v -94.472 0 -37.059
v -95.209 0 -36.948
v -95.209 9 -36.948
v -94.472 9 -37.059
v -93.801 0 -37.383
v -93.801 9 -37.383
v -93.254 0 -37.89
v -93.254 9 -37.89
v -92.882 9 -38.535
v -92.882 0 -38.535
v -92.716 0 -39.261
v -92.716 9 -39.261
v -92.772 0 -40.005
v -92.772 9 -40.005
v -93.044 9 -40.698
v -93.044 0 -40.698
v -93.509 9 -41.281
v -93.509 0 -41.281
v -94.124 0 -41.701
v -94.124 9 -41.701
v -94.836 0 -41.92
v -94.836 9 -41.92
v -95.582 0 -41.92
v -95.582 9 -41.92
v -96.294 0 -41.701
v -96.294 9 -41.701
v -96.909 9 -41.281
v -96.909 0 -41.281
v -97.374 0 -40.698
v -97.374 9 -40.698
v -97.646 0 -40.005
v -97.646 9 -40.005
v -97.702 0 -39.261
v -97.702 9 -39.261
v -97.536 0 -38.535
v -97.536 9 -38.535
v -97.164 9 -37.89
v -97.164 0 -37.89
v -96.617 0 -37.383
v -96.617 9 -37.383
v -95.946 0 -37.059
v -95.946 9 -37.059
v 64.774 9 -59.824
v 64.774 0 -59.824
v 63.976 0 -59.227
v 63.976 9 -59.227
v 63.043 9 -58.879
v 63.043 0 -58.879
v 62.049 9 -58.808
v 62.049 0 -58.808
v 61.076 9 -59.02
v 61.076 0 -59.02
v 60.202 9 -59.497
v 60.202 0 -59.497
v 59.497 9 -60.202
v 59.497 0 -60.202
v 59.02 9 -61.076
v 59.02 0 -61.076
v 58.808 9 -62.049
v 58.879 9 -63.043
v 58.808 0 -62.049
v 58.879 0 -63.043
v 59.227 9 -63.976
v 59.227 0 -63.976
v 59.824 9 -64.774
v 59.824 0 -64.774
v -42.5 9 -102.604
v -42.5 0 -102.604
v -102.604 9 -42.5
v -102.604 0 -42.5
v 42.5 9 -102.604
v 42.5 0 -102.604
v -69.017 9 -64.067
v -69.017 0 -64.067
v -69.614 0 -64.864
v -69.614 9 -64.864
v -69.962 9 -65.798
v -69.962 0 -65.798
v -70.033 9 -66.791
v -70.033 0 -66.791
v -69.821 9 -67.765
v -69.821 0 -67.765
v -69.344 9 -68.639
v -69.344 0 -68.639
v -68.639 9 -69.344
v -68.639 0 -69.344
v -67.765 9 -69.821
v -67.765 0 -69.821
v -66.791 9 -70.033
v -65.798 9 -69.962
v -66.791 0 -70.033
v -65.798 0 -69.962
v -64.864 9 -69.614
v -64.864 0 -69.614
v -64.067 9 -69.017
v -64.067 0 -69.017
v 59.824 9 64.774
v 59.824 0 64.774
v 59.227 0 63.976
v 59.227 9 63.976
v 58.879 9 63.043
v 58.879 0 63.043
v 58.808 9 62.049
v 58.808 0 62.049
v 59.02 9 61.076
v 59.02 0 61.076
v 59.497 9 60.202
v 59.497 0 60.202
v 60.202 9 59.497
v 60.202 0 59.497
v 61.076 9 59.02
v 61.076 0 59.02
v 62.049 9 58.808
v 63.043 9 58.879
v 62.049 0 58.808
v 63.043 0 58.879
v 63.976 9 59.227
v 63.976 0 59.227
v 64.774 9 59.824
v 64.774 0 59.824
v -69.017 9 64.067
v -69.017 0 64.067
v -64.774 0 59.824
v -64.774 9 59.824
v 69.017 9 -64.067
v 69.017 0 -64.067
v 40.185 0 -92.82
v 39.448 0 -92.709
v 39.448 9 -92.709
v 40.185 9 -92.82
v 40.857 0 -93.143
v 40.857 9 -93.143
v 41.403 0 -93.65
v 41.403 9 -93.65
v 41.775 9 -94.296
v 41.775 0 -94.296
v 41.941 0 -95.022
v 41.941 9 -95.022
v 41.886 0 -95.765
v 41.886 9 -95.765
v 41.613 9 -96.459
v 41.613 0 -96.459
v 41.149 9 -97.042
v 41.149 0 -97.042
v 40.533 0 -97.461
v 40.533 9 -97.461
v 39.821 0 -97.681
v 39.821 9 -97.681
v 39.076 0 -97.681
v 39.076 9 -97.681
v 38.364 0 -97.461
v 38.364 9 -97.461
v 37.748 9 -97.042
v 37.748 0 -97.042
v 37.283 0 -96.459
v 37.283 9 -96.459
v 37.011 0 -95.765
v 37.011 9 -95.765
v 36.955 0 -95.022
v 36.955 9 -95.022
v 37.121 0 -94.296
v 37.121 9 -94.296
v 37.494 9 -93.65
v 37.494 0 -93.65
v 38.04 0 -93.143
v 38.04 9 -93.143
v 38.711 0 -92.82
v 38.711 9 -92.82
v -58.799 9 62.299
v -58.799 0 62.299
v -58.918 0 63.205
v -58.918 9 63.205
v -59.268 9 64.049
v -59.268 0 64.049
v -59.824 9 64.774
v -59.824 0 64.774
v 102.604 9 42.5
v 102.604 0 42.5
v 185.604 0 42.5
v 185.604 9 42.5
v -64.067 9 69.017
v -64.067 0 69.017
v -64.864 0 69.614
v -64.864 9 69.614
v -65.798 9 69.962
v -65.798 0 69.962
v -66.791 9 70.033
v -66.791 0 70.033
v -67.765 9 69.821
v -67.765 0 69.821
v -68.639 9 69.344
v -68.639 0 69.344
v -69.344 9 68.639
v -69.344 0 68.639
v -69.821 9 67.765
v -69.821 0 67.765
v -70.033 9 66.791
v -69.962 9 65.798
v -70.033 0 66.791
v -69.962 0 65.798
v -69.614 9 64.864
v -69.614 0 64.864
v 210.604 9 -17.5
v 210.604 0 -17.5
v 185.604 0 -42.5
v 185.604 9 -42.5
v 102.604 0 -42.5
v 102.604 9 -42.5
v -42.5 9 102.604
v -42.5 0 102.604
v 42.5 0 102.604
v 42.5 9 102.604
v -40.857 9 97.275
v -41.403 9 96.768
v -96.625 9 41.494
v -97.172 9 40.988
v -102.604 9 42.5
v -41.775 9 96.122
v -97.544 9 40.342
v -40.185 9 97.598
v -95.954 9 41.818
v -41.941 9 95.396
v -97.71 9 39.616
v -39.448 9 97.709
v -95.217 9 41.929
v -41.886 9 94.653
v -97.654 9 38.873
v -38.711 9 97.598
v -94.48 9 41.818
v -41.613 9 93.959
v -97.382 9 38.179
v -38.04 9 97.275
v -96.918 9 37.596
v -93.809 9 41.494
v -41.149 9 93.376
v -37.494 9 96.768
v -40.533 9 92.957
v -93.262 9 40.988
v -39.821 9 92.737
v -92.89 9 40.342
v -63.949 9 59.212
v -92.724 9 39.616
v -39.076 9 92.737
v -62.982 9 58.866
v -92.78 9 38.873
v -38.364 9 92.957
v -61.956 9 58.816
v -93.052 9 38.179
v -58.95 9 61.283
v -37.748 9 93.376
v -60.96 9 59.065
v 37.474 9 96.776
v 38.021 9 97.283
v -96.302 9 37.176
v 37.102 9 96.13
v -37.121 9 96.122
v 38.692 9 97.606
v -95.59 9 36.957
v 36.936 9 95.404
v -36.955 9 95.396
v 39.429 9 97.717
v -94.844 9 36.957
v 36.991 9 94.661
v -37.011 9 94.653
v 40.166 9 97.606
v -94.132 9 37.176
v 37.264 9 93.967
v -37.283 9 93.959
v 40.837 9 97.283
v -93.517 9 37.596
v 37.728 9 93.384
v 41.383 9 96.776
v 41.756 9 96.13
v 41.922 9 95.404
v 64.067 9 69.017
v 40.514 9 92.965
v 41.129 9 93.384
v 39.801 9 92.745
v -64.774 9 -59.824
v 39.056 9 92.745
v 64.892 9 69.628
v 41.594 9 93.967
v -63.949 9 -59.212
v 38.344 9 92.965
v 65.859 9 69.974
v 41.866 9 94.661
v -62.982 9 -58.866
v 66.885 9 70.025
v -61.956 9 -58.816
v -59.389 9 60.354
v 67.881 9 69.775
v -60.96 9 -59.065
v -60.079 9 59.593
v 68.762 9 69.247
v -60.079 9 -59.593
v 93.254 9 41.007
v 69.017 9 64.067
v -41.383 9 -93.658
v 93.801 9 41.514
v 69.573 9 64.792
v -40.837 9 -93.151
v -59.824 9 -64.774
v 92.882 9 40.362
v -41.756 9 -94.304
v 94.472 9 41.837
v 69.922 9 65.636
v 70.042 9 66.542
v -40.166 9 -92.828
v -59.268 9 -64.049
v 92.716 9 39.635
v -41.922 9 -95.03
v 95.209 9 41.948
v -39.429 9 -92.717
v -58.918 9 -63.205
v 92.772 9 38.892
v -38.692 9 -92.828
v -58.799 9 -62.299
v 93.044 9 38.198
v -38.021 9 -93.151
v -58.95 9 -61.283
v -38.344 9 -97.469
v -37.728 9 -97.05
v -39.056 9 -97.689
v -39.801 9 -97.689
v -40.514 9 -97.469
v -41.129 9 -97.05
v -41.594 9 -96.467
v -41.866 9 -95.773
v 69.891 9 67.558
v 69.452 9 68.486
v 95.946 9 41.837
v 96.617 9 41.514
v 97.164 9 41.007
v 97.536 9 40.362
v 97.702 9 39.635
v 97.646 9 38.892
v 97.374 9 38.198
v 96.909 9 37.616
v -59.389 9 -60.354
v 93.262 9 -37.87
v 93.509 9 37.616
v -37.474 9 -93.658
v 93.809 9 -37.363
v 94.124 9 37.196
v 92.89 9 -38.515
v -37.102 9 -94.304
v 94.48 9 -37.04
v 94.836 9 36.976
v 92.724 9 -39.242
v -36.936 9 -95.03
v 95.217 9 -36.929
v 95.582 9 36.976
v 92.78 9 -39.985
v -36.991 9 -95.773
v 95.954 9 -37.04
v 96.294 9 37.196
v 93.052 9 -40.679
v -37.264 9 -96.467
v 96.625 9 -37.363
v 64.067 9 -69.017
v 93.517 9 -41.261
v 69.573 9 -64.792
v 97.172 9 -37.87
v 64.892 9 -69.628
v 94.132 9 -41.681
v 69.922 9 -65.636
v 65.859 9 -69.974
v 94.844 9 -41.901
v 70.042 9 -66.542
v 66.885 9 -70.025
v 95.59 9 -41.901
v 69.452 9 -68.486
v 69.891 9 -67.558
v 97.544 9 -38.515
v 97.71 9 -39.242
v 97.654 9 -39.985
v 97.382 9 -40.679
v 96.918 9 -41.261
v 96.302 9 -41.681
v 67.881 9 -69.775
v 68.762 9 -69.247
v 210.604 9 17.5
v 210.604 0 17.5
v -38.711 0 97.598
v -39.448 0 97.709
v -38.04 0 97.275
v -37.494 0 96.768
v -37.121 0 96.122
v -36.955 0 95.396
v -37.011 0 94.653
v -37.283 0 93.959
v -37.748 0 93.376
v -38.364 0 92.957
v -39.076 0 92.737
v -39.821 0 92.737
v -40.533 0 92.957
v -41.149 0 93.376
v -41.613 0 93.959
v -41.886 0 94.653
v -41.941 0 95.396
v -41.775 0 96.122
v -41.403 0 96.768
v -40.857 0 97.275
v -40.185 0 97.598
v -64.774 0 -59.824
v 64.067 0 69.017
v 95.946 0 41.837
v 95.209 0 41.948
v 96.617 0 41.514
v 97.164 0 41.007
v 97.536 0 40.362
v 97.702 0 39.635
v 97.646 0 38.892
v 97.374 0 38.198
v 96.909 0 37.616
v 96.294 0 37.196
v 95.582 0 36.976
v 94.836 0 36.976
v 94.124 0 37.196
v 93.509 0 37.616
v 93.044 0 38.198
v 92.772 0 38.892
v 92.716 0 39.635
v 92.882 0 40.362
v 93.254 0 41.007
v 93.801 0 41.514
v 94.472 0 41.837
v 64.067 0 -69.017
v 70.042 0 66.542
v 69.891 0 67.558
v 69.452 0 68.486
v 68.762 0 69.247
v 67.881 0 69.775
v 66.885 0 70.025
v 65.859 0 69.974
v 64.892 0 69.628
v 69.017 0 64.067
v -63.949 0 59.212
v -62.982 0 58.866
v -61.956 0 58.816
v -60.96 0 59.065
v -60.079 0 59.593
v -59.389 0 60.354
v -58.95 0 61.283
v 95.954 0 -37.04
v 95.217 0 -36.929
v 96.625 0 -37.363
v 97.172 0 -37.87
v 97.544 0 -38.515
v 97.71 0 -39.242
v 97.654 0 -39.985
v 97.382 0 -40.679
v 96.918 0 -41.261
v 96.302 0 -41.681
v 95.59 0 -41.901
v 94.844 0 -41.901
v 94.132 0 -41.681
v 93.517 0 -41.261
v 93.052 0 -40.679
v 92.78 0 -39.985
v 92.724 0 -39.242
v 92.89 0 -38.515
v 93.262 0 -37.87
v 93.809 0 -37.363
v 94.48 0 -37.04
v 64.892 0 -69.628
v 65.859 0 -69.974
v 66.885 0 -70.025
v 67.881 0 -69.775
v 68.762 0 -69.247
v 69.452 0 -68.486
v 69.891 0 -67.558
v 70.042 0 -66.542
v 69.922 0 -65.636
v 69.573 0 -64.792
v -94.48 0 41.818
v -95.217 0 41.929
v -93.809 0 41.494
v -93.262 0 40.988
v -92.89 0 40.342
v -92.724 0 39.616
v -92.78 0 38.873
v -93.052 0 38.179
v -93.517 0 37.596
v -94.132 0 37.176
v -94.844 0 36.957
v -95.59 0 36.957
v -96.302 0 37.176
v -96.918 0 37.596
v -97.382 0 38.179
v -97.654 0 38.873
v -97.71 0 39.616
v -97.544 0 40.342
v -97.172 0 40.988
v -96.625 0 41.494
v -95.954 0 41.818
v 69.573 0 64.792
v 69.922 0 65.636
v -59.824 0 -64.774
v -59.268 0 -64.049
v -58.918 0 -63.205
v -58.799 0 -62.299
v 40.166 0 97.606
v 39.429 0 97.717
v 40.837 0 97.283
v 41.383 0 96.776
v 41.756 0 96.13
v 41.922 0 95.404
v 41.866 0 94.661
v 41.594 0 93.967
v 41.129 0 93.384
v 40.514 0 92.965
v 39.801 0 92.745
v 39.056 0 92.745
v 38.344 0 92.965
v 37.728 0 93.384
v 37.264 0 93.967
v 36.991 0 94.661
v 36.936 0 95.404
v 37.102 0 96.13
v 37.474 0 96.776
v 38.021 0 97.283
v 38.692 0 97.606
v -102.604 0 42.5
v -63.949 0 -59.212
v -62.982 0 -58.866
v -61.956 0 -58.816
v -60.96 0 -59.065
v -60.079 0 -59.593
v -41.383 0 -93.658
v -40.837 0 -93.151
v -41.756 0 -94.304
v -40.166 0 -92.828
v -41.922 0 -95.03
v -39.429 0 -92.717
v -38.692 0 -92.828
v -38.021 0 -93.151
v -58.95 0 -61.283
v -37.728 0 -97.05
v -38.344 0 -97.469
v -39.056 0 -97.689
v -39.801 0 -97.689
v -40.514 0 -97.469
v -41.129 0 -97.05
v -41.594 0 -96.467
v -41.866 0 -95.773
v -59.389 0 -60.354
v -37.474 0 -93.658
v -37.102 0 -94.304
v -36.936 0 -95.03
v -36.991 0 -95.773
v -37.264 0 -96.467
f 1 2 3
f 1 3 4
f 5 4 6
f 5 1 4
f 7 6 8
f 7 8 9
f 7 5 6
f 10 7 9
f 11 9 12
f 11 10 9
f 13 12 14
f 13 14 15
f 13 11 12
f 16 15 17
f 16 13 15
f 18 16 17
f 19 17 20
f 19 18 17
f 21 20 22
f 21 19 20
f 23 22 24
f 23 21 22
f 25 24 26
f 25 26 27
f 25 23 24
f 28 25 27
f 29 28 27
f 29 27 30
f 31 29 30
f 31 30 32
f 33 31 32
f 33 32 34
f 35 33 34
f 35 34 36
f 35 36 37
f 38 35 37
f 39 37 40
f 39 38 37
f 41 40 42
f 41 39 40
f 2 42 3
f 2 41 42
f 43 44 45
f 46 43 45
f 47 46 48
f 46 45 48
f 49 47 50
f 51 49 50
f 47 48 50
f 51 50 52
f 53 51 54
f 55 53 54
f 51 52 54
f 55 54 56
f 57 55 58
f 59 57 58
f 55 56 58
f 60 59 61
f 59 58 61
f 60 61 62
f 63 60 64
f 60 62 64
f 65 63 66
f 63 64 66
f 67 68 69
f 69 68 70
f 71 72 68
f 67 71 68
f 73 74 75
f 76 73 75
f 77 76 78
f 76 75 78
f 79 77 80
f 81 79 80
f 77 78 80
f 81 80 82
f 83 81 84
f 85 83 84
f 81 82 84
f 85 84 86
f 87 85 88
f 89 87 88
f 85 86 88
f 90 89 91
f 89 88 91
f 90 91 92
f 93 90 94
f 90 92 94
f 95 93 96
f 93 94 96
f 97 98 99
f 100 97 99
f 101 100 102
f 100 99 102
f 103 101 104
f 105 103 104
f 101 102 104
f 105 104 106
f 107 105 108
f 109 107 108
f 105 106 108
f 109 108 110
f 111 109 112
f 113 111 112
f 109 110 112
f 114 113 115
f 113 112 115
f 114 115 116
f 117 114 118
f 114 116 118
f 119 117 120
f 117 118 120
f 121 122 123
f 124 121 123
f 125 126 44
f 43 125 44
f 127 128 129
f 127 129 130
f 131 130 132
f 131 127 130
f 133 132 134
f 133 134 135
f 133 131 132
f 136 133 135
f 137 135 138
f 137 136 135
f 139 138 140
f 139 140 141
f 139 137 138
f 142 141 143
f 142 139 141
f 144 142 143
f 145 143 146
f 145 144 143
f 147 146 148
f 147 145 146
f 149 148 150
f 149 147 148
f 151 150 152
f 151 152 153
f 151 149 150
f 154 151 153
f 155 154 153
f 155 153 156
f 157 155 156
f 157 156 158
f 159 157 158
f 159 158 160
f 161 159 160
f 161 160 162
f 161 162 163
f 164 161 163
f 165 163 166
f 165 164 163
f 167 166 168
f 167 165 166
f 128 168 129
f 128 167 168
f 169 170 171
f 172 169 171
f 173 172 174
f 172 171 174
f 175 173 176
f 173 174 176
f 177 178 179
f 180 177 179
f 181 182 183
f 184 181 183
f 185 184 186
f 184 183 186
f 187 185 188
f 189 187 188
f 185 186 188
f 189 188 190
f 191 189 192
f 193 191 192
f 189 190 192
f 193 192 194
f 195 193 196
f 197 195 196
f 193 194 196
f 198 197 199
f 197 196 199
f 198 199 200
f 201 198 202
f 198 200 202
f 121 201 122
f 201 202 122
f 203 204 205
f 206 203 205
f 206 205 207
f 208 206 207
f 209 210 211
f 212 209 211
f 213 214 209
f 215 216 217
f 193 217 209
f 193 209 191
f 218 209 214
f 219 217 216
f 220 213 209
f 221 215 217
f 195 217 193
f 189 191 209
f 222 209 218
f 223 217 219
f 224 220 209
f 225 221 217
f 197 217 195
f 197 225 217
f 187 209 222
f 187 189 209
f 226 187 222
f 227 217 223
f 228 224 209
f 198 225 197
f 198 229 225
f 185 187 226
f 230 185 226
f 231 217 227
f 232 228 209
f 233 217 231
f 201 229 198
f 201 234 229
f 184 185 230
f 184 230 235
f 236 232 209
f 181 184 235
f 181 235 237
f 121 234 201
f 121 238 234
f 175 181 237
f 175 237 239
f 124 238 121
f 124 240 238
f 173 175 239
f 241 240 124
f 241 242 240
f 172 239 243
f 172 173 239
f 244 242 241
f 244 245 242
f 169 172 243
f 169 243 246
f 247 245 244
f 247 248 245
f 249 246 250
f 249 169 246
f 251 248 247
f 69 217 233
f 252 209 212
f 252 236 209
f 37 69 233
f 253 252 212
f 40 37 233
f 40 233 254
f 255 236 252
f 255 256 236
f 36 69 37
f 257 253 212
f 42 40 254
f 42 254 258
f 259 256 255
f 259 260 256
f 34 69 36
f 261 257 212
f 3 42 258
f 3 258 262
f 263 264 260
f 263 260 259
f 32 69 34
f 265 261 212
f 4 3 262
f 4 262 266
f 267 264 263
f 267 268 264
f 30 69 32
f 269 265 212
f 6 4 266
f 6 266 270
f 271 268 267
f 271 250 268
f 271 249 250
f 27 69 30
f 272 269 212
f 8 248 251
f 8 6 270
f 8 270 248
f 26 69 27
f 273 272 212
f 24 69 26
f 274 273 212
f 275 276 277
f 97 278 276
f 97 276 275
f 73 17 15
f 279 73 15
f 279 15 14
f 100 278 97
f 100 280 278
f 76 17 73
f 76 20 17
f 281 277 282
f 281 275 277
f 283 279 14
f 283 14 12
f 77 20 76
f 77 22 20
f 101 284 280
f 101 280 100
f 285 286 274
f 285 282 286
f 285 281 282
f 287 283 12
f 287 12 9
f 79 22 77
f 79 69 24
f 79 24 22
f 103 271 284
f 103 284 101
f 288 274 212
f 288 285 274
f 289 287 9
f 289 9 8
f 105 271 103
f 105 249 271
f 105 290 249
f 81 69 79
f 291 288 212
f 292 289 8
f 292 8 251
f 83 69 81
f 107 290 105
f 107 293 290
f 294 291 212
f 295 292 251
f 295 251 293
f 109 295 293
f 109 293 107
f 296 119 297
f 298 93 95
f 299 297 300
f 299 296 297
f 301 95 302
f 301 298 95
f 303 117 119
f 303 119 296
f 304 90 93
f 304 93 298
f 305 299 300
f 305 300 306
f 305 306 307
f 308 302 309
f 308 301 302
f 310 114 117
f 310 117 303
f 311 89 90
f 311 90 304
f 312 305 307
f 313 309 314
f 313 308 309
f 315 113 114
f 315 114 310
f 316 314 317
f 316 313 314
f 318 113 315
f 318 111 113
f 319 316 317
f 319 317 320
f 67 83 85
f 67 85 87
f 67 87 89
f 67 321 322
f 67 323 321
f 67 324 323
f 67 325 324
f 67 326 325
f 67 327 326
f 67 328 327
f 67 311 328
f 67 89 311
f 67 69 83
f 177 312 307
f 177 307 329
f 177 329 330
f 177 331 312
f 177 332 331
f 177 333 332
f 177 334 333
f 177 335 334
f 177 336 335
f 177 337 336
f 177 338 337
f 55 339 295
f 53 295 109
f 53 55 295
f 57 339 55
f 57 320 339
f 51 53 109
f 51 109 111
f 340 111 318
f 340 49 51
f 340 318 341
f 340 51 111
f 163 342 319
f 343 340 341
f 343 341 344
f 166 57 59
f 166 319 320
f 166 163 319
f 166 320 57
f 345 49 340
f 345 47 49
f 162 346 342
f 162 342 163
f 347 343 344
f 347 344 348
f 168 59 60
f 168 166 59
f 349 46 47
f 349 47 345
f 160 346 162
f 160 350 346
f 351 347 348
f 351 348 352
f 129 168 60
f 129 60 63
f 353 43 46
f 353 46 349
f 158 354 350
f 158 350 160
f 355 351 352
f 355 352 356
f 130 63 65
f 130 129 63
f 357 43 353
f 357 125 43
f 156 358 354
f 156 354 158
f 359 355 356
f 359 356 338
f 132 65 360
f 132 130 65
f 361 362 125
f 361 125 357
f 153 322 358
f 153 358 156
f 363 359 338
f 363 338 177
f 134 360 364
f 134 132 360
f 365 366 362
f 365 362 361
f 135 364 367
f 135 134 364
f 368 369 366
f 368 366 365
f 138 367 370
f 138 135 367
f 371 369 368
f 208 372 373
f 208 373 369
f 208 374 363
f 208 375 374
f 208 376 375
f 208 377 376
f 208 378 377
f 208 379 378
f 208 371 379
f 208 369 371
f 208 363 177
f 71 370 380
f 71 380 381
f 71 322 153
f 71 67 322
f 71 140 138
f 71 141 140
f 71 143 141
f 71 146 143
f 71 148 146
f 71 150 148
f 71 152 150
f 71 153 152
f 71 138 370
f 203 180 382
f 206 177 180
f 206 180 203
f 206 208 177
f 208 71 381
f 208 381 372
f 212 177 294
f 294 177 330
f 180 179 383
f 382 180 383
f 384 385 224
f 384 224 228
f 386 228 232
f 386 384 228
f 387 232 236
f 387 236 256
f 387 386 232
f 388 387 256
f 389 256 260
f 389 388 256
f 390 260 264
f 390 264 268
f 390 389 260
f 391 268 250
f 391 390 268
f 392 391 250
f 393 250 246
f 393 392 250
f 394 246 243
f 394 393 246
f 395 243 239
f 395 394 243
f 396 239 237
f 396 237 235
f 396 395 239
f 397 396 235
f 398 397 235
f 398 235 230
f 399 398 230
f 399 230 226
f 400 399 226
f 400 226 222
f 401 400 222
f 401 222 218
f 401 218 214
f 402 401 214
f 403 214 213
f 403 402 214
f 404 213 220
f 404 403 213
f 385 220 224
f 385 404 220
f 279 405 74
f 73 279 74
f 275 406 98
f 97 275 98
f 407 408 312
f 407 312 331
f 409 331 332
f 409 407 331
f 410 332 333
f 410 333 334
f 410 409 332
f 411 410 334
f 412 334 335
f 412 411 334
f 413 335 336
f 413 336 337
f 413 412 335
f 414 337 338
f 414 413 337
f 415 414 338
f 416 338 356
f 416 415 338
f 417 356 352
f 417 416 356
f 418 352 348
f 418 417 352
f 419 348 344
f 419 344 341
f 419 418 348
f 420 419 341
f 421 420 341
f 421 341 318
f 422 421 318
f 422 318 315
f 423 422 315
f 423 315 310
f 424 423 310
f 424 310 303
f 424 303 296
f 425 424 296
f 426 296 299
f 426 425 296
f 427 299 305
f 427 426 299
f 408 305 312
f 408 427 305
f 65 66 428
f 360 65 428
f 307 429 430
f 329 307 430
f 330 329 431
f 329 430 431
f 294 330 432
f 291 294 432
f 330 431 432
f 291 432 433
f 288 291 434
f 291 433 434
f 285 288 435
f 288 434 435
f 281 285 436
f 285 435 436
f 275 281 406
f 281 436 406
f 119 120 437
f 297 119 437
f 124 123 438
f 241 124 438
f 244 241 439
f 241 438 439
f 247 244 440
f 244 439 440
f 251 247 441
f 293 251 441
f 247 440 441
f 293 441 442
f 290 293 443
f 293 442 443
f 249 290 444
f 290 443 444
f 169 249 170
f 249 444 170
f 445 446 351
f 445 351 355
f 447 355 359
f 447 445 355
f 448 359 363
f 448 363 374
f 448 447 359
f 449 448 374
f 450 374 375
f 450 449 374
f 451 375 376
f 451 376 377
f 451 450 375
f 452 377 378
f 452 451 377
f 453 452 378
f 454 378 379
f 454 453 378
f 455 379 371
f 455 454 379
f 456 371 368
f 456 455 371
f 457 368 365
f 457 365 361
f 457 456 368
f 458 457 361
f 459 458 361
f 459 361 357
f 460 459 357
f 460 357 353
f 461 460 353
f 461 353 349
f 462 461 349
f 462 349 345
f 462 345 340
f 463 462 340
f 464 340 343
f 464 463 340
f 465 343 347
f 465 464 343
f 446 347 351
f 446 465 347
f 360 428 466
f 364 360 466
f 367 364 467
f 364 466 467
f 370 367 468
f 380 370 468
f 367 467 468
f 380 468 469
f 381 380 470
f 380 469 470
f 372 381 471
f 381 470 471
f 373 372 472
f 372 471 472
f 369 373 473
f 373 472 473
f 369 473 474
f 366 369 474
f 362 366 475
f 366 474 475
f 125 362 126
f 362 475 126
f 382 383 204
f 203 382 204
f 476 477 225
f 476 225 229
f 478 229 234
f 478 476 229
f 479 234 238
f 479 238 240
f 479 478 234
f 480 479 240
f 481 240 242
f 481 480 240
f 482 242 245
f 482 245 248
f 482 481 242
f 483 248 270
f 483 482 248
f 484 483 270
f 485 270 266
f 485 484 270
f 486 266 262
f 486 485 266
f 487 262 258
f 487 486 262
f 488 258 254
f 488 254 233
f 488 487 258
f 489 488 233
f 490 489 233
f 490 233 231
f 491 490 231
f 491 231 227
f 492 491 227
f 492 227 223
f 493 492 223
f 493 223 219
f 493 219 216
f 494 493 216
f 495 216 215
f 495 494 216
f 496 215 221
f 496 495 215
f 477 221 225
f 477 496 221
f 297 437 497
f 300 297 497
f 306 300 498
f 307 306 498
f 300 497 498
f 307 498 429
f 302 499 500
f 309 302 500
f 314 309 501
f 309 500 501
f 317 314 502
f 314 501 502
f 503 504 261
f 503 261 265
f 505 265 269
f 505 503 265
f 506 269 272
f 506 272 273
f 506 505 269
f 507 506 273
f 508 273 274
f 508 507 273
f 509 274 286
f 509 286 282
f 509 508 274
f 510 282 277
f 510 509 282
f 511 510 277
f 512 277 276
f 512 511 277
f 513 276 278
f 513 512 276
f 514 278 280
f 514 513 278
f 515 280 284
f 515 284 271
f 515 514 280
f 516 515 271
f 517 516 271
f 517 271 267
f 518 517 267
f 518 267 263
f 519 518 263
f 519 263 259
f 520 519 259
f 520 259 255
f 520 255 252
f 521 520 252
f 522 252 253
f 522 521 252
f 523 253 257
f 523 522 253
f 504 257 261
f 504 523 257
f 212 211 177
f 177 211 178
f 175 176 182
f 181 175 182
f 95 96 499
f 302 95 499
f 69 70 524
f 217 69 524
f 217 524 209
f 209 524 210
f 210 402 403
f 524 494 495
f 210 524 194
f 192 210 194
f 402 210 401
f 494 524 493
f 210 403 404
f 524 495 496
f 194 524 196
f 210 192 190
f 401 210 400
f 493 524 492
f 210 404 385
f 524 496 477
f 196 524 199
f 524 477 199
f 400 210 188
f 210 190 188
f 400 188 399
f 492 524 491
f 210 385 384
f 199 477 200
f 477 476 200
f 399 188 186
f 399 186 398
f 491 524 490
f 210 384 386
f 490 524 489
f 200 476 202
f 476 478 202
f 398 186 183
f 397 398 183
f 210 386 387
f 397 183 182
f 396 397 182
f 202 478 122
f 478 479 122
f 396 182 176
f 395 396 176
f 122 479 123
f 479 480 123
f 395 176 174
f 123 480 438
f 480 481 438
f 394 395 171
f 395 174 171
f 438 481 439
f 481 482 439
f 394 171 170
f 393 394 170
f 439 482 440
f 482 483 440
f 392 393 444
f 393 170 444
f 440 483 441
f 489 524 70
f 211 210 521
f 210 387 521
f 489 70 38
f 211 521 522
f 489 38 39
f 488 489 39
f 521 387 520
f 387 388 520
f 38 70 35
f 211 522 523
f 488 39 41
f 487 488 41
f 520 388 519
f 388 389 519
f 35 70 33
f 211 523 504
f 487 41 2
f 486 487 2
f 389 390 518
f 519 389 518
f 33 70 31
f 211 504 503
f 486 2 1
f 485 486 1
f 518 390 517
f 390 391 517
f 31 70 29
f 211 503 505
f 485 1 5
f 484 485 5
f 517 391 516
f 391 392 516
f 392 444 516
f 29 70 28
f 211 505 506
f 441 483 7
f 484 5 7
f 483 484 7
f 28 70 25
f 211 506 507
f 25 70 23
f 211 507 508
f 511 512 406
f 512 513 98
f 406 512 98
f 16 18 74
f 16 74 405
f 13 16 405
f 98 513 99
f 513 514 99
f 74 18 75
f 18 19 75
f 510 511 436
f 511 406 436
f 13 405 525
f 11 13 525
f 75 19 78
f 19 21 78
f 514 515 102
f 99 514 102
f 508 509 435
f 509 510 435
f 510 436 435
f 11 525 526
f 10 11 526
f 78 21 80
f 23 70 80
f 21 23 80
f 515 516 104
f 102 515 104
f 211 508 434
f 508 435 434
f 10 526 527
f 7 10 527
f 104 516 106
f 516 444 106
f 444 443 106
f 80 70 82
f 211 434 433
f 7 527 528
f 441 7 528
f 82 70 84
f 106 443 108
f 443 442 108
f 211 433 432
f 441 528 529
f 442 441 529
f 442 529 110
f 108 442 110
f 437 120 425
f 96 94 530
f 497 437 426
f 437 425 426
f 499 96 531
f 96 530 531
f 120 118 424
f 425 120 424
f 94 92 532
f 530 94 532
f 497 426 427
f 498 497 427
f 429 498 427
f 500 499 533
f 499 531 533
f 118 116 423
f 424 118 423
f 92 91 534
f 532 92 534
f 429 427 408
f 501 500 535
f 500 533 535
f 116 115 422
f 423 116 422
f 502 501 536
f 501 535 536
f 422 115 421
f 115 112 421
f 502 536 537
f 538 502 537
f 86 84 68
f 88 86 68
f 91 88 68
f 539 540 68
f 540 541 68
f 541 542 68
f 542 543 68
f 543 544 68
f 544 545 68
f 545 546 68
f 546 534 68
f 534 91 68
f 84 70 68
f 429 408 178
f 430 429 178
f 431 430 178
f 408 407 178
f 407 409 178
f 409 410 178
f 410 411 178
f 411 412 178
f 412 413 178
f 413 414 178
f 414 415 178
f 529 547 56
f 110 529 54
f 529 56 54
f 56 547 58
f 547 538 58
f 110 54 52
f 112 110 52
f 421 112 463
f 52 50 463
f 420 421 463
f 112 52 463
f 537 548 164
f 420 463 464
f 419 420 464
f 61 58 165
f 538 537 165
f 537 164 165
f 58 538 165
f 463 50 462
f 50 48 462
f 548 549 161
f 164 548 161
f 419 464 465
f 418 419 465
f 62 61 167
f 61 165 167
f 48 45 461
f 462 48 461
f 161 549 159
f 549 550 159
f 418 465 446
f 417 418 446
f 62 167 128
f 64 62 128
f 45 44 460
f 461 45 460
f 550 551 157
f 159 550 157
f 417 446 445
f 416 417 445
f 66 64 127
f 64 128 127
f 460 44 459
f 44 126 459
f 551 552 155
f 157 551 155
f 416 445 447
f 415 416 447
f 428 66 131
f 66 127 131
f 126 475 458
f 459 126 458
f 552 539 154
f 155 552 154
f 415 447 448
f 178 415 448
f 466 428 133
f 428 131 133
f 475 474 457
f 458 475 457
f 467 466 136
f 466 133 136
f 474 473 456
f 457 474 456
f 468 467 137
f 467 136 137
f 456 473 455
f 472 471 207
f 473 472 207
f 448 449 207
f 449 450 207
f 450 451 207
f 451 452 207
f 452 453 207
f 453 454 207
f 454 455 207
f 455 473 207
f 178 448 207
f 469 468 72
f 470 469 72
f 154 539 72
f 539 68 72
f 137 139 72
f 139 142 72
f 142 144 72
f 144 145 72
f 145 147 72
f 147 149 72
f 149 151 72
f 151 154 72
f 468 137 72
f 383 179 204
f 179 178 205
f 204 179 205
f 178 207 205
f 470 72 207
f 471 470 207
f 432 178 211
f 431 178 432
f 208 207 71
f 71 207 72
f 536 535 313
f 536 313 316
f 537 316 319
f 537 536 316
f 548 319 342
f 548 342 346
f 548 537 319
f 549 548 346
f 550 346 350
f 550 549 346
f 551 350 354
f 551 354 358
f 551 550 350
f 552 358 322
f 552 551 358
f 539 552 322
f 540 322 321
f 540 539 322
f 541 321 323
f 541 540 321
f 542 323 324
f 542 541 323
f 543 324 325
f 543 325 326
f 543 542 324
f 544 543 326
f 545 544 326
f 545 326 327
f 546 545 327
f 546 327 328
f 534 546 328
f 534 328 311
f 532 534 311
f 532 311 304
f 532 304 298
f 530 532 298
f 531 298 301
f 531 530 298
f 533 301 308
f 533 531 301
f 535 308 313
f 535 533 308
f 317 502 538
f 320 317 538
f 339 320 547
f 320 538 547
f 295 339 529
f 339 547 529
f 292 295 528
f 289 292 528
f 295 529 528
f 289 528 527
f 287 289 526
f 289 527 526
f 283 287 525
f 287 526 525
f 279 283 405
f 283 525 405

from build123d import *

# Parameters (mm, degrees)
SKETCH1_R           = 2.5
BOSS_EXTRUDE1_DEPTH = 9


with BuildPart() as part:
    # Sketch1 → Boss-Extrude1 (new body)
    # profile 1 of 2: a face of its own
    with BuildSketch(Plane(origin=(0, 0, 0), x_dir=(1, 0, 0), z_dir=(0, 1, 0))):
        Polygon((42.5, 102.604076401), (-42.5, 102.604076401), (-102.604076401, 42.5), (-102.604076401, -42.5), (-42.5, -102.604076401), (42.5, -102.604076401), (102.604076401, -42.5), (102.604076401, 42.5), align=None)
        with Locations(Location((-39.448264129, -95.209016687, 0), (0, 0, 270))):
            Circle(SKETCH1_R, mode=Mode.SUBTRACT)
        with BuildLine():
            Line((-59.824116139, -64.773863607), (-64.066756826, -69.016504294))
            ThreePointArc((-64.066756826, -69.016504294), (-69.016504294, -69.016504294), (-69.016504294, -64.066756826))
            Line((-69.016504294, -64.066756826), (-64.773863607, -59.824116139))
            ThreePointArc((-64.773863607, -59.824116139), (-60.95959786, -59.065411509), (-58.798989873, -62.298989873))
            ThreePointArc((-58.798989873, -62.298989873), (-59.065411509, -63.638381887), (-59.824116139, -64.773863607))
        make_face(mode=Mode.SUBTRACT)
        with Locations(Location((39.428806258, -95.217076401, 0), (0, 0, 270))):
            Circle(SKETCH1_R, mode=Mode.SUBTRACT)
        with Locations(Location((-95.217076401, -39.428806258, 0), (0, 0, 270))):
            Circle(SKETCH1_R, mode=Mode.SUBTRACT)
        with BuildLine():
            Line((64.773863607, -59.824116139), (69.016504294, -64.066756826))
            ThreePointArc((69.016504294, -64.066756826), (69.775208924, -65.202238547), (70.04163056, -66.54163056))
            ThreePointArc((70.04163056, -66.54163056), (67.881022574, -69.775208924), (64.066756826, -69.016504294))
            Line((64.066756826, -69.016504294), (59.824116139, -64.773863607))
            ThreePointArc((59.824116139, -64.773863607), (59.824116139, -59.824116139), (64.773863607, -59.824116139))
        make_face(mode=Mode.SUBTRACT)
        with Locations(Location((95.209016687, -39.448264129, 0), (0, 0, 270))):
            Circle(SKETCH1_R, mode=Mode.SUBTRACT)
        with Locations(Location((-95.209016687, 39.448264129, 0), (0, 0, 270))):
            Circle(SKETCH1_R, mode=Mode.SUBTRACT)
        with BuildLine():
            Line((-64.773863607, 59.824116139), (-69.016504294, 64.066756826))
            ThreePointArc((-69.016504294, 64.066756826), (-69.016504294, 69.016504294), (-64.066756826, 69.016504294))
            Line((-64.066756826, 69.016504294), (-59.824116139, 64.773863607))
            ThreePointArc((-59.824116139, 64.773863607), (-59.065411509, 63.638381887), (-58.798989873, 62.298989873))
            ThreePointArc((-58.798989873, 62.298989873), (-60.95959786, 59.065411509), (-64.773863607, 59.824116139))
        make_face(mode=Mode.SUBTRACT)
        with Locations(Location((-39.428806258, 95.217076401, 0), (0, 0, 270))):
            Circle(SKETCH1_R, mode=Mode.SUBTRACT)
        with Locations(Location((39.448264129, 95.209016687, 0), (0, 0, 270))):
            Circle(SKETCH1_R, mode=Mode.SUBTRACT)
        with Locations(Location((95.217076401, 39.428806258, 0), (0, 0, 270))):
            Circle(SKETCH1_R, mode=Mode.SUBTRACT)
        with BuildLine():
            Line((59.824116139, 64.773863607), (64.066756826, 69.016504294))
            ThreePointArc((64.066756826, 69.016504294), (67.881022574, 69.775208924), (70.04163056, 66.54163056))
            ThreePointArc((70.04163056, 66.54163056), (69.775208924, 65.202238547), (69.016504294, 64.066756826))
            Line((69.016504294, 64.066756826), (64.773863607, 59.824116139))
            ThreePointArc((64.773863607, 59.824116139), (59.824116139, 59.824116139), (59.824116139, 64.773863607))
        make_face(mode=Mode.SUBTRACT)
    # profile 2 of 2: a face of its own
    with BuildSketch(Plane(origin=(0, 0, 0), x_dir=(1, 0, 0), z_dir=(0, 1, 0))):
        Polygon((102.604076401, -42.5), (185.604076401, -42.5), (210.604076401, -17.5), (210.604076401, 17.5), (185.604076401, 42.5), (102.604076401, 42.5), align=None)
    extrude(amount=BOSS_EXTRUDE1_DEPTH)


solid = part.part
